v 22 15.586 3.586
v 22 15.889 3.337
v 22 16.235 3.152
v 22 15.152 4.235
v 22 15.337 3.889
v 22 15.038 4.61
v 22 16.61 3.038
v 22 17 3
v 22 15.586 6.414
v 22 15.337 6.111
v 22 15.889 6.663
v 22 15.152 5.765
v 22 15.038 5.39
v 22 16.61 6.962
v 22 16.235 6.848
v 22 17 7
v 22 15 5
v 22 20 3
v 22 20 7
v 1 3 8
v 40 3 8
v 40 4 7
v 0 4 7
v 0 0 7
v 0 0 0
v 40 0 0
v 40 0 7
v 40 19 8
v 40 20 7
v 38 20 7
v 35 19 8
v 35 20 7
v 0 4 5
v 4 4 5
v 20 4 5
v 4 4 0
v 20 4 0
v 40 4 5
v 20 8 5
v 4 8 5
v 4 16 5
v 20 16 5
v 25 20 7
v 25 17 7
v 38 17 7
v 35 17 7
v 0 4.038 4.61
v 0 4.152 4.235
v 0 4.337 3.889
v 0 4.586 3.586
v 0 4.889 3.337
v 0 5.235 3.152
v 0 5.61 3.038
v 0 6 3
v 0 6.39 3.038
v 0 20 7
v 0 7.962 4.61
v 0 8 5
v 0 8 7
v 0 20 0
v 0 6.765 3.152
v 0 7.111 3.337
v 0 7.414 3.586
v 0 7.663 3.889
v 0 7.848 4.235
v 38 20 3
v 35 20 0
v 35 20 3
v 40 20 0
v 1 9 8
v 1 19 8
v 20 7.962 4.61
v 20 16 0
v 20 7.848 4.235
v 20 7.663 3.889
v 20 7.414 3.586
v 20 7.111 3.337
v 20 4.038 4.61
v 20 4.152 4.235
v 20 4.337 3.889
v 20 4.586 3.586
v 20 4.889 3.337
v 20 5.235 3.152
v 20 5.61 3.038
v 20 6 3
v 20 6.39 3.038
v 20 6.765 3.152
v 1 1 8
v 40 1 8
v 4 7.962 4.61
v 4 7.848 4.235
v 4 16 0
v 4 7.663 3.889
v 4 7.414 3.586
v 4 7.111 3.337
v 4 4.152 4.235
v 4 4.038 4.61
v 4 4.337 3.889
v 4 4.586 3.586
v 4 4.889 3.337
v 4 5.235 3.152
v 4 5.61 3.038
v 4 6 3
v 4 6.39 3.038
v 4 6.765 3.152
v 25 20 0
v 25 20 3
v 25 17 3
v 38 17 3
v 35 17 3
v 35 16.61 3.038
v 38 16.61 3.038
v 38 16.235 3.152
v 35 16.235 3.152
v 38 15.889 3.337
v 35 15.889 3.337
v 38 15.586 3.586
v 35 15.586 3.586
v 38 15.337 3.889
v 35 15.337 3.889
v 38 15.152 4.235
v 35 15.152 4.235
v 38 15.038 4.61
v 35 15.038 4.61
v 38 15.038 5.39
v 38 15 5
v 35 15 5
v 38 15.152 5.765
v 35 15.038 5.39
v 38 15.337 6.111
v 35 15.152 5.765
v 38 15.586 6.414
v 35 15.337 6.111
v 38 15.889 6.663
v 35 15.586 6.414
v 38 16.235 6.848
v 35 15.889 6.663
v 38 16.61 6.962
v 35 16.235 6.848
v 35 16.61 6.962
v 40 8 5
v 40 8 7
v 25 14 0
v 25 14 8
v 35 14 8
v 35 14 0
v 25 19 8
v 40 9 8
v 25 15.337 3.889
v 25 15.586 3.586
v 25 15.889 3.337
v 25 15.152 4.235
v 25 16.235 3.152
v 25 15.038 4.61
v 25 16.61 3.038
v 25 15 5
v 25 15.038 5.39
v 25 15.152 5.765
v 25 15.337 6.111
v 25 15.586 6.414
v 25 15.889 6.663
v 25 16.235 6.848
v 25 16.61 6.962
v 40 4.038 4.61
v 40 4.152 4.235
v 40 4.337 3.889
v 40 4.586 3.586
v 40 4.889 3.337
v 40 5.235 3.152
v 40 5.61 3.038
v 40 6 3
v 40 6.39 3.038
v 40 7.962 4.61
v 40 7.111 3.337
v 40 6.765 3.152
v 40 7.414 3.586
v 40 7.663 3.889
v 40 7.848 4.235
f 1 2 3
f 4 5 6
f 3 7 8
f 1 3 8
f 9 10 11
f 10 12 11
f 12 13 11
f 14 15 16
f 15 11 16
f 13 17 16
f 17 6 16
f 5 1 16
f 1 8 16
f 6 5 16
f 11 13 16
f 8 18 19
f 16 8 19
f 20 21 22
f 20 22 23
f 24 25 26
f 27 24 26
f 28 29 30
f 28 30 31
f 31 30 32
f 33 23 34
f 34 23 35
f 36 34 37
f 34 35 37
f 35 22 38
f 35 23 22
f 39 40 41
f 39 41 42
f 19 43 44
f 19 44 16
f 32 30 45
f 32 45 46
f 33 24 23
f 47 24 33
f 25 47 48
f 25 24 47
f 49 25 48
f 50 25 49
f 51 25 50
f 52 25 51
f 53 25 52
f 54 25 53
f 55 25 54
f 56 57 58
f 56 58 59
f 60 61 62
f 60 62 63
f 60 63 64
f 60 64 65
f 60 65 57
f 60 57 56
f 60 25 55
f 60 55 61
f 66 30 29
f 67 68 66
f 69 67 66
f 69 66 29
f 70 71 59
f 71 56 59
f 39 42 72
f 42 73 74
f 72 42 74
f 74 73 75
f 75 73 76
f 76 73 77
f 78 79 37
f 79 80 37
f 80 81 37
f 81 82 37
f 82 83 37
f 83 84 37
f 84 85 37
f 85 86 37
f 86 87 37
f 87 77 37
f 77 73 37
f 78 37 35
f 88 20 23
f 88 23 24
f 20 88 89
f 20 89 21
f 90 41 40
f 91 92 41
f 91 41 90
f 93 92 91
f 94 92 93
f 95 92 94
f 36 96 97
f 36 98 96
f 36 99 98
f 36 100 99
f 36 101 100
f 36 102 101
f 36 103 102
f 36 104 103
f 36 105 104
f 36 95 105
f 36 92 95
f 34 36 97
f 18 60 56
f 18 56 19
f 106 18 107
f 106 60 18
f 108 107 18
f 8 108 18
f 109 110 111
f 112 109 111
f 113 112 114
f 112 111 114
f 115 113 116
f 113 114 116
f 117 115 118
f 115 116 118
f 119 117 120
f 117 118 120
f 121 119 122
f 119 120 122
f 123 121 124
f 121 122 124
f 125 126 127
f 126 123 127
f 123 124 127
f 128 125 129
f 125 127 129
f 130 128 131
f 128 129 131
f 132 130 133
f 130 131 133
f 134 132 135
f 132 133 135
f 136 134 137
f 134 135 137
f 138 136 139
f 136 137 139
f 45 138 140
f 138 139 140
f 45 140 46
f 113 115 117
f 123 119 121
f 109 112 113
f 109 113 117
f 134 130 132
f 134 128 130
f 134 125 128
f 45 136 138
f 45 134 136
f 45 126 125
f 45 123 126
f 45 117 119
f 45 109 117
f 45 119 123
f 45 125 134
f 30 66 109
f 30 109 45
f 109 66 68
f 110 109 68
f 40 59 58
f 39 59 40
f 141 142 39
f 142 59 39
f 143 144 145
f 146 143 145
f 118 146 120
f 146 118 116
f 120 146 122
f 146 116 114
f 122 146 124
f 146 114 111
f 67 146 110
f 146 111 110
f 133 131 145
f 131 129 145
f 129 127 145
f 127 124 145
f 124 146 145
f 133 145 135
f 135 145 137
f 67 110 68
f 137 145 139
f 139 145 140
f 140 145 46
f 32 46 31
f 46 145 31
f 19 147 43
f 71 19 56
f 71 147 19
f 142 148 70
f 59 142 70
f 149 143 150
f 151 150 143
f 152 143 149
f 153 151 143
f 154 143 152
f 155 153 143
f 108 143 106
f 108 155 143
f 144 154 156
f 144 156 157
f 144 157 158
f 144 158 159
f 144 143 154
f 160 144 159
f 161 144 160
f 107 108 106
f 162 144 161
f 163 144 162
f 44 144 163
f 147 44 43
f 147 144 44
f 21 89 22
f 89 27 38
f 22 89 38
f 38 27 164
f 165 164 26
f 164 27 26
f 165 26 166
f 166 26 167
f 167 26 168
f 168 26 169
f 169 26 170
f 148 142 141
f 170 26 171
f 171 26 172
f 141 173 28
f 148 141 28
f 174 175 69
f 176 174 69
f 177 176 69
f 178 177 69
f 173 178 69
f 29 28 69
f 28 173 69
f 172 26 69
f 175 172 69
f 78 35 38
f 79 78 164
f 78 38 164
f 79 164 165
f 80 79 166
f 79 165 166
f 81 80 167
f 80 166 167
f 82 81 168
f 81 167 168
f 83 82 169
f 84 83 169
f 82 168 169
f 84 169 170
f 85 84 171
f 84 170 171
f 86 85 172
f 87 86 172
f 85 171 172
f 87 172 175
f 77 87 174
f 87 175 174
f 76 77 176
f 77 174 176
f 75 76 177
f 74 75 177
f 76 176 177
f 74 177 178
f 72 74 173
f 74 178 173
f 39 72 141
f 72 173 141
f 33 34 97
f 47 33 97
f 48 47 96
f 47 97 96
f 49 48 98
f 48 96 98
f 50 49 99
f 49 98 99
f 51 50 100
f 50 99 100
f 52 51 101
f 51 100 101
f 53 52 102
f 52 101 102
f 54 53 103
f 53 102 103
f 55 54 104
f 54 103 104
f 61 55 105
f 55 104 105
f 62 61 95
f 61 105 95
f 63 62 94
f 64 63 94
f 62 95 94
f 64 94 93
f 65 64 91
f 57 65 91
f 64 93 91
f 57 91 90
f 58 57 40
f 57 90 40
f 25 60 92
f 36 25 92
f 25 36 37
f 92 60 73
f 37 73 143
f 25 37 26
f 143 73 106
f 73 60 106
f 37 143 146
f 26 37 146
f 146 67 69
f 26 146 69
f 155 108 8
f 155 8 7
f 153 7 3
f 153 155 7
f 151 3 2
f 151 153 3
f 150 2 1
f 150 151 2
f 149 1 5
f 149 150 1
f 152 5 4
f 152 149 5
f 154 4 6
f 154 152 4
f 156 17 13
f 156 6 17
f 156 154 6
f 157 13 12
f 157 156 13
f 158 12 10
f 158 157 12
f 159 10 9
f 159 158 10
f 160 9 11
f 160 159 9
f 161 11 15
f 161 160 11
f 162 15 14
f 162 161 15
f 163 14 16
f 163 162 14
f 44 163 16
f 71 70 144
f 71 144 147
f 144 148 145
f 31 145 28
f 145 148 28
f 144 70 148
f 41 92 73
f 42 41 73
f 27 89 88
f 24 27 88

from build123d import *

# Parameters (mm, degrees)
SKETCH_W             = 40
SKETCH_H             = 20
PAD_DEPTH            = 10
POCKET_DEPTH         = 40.001
SKETCH002_W          = 10
SKETCH002_H          = 6
POCKET001_DEPTH      = 8.001
SKETCH003_R          = 2
POCKET002_DEPTH      = 3
POCKET002_DEPTH_BACK = -13
SKETCH004_W          = 16
SKETCH004_H          = 4
POCKET003_DEPTH      = 3
CHAMFER_SIZE         = 1
CHAMFER001_SIZE      = 1
CHAMFER002_SIZE      = 1
CHAMFER003_SIZE      = 1
CHAMFER004_SIZE      = 1
CHAMFER005_SIZE      = 1
CHAMFER006_SIZE      = 1
SKETCH005_W          = 16
SKETCH005_H          = 12
POCKET004_DEPTH      = 5


with BuildPart() as part:
    # Sketch → Pad (new body)
    with BuildSketch(Plane.XY):
        with Locations((20, 10)):
            Rectangle(SKETCH_W, SKETCH_H)
    extrude(amount=PAD_DEPTH)

    # Sketch001 (on Face2 of Pad) → Pocket (cut, through all)
    with BuildSketch(Plane.YZ.offset(40)):
        with BuildLine():
            Line((0, 8), (4, 8))
            Line((4, 8), (4, 5))
            ThreePointArc((4, 5), (6, 3), (8, 5))
            Line((8, 8), (8, 5))
            Line((8, 8), (25, 8))
            Line((25, 8), (25, 10))
            Line((25, 10), (0, 10))
            Line((0, 10), (0, 8))
        make_face()
    extrude(amount=-POCKET_DEPTH, mode=Mode.SUBTRACT)

    # Sketch002 (on Face4 of Pocket) → Pocket001 (cut, through all)
    with BuildSketch(Plane.XY.offset(8)):
        with Locations((30, 17)):
            Rectangle(SKETCH002_W, SKETCH002_H)
    extrude(amount=-POCKET001_DEPTH, mode=Mode.SUBTRACT)

    # Sketch003 (on Face9 of Pocket001) → Pocket002 (cut, two sides)
    with BuildSketch(Plane(origin=(35, 0, 0), x_dir=(0, -1, 0), z_dir=(-1, 0, 0))) as pocket002_sk:
        with Locations((-17, 5)):
            Circle(SKETCH003_R)
    extrude(amount=-POCKET002_DEPTH, mode=Mode.SUBTRACT)
    extrude(pocket002_sk.sketch, amount=-POCKET002_DEPTH_BACK, mode=Mode.SUBTRACT)

    # Sketch004 (on Face1 of Pocket002) → Pocket003 (cut)
    with BuildSketch(Plane(origin=(0, 20, 0), x_dir=(-1, 0, 0), z_dir=(0, 1, 0))):
        with Locations((-30, 5)):
            Rectangle(SKETCH004_W, SKETCH004_H)
    extrude(amount=-POCKET003_DEPTH, mode=Mode.SUBTRACT)

    # Chamfer
    chamfer_edges = [part.edges().sort_by_distance(p)[0] for p in [
        (20, 0, 8),
    ]]
    chamfer(chamfer_edges, length=CHAMFER_SIZE)

    # Chamfer001
    chamfer001_edges = [part.edges().sort_by_distance(p)[0] for p in [
        (12.5, 20, 8),
    ]]
    chamfer(chamfer001_edges, length=CHAMFER001_SIZE)

    # Chamfer002
    chamfer002_edges = [part.edges().sort_by_distance(p)[0] for p in [
        (37.5, 20, 8),
    ]]
    chamfer(chamfer002_edges, length=CHAMFER002_SIZE)

    # Chamfer003
    chamfer003_edges = [part.edges().sort_by_distance(p)[0] for p in [
        (0, 13.5, 8),
    ]]
    chamfer(chamfer003_edges, length=CHAMFER003_SIZE)

    # Chamfer004
    chamfer004_edges = [part.edges().sort_by_distance(p)[0] for p in [
        (0, 2.5, 8),
    ]]
    chamfer(chamfer004_edges, length=CHAMFER004_SIZE)

    # Chamfer005
    chamfer005_edges = [part.edges().sort_by_distance(p)[0] for p in [
        (20.5, 8, 8),
    ]]
    chamfer(chamfer005_edges, length=CHAMFER005_SIZE)

    # Chamfer006
    chamfer006_edges = [part.edges().sort_by_distance(p)[0] for p in [
        (20.5, 4, 8),
    ]]
    chamfer(chamfer006_edges, length=CHAMFER006_SIZE)

    # Sketch005 (on Face11 of Chamfer006) → Pocket004 (cut)
    with BuildSketch(Plane(origin=(0, 0, 0), x_dir=(1, 0, 0), z_dir=(0, 0, -1))):
        with Locations((12, -10)):
            Rectangle(SKETCH005_W, SKETCH005_H)
    extrude(amount=-POCKET004_DEPTH, mode=Mode.SUBTRACT)


solid = part.part
